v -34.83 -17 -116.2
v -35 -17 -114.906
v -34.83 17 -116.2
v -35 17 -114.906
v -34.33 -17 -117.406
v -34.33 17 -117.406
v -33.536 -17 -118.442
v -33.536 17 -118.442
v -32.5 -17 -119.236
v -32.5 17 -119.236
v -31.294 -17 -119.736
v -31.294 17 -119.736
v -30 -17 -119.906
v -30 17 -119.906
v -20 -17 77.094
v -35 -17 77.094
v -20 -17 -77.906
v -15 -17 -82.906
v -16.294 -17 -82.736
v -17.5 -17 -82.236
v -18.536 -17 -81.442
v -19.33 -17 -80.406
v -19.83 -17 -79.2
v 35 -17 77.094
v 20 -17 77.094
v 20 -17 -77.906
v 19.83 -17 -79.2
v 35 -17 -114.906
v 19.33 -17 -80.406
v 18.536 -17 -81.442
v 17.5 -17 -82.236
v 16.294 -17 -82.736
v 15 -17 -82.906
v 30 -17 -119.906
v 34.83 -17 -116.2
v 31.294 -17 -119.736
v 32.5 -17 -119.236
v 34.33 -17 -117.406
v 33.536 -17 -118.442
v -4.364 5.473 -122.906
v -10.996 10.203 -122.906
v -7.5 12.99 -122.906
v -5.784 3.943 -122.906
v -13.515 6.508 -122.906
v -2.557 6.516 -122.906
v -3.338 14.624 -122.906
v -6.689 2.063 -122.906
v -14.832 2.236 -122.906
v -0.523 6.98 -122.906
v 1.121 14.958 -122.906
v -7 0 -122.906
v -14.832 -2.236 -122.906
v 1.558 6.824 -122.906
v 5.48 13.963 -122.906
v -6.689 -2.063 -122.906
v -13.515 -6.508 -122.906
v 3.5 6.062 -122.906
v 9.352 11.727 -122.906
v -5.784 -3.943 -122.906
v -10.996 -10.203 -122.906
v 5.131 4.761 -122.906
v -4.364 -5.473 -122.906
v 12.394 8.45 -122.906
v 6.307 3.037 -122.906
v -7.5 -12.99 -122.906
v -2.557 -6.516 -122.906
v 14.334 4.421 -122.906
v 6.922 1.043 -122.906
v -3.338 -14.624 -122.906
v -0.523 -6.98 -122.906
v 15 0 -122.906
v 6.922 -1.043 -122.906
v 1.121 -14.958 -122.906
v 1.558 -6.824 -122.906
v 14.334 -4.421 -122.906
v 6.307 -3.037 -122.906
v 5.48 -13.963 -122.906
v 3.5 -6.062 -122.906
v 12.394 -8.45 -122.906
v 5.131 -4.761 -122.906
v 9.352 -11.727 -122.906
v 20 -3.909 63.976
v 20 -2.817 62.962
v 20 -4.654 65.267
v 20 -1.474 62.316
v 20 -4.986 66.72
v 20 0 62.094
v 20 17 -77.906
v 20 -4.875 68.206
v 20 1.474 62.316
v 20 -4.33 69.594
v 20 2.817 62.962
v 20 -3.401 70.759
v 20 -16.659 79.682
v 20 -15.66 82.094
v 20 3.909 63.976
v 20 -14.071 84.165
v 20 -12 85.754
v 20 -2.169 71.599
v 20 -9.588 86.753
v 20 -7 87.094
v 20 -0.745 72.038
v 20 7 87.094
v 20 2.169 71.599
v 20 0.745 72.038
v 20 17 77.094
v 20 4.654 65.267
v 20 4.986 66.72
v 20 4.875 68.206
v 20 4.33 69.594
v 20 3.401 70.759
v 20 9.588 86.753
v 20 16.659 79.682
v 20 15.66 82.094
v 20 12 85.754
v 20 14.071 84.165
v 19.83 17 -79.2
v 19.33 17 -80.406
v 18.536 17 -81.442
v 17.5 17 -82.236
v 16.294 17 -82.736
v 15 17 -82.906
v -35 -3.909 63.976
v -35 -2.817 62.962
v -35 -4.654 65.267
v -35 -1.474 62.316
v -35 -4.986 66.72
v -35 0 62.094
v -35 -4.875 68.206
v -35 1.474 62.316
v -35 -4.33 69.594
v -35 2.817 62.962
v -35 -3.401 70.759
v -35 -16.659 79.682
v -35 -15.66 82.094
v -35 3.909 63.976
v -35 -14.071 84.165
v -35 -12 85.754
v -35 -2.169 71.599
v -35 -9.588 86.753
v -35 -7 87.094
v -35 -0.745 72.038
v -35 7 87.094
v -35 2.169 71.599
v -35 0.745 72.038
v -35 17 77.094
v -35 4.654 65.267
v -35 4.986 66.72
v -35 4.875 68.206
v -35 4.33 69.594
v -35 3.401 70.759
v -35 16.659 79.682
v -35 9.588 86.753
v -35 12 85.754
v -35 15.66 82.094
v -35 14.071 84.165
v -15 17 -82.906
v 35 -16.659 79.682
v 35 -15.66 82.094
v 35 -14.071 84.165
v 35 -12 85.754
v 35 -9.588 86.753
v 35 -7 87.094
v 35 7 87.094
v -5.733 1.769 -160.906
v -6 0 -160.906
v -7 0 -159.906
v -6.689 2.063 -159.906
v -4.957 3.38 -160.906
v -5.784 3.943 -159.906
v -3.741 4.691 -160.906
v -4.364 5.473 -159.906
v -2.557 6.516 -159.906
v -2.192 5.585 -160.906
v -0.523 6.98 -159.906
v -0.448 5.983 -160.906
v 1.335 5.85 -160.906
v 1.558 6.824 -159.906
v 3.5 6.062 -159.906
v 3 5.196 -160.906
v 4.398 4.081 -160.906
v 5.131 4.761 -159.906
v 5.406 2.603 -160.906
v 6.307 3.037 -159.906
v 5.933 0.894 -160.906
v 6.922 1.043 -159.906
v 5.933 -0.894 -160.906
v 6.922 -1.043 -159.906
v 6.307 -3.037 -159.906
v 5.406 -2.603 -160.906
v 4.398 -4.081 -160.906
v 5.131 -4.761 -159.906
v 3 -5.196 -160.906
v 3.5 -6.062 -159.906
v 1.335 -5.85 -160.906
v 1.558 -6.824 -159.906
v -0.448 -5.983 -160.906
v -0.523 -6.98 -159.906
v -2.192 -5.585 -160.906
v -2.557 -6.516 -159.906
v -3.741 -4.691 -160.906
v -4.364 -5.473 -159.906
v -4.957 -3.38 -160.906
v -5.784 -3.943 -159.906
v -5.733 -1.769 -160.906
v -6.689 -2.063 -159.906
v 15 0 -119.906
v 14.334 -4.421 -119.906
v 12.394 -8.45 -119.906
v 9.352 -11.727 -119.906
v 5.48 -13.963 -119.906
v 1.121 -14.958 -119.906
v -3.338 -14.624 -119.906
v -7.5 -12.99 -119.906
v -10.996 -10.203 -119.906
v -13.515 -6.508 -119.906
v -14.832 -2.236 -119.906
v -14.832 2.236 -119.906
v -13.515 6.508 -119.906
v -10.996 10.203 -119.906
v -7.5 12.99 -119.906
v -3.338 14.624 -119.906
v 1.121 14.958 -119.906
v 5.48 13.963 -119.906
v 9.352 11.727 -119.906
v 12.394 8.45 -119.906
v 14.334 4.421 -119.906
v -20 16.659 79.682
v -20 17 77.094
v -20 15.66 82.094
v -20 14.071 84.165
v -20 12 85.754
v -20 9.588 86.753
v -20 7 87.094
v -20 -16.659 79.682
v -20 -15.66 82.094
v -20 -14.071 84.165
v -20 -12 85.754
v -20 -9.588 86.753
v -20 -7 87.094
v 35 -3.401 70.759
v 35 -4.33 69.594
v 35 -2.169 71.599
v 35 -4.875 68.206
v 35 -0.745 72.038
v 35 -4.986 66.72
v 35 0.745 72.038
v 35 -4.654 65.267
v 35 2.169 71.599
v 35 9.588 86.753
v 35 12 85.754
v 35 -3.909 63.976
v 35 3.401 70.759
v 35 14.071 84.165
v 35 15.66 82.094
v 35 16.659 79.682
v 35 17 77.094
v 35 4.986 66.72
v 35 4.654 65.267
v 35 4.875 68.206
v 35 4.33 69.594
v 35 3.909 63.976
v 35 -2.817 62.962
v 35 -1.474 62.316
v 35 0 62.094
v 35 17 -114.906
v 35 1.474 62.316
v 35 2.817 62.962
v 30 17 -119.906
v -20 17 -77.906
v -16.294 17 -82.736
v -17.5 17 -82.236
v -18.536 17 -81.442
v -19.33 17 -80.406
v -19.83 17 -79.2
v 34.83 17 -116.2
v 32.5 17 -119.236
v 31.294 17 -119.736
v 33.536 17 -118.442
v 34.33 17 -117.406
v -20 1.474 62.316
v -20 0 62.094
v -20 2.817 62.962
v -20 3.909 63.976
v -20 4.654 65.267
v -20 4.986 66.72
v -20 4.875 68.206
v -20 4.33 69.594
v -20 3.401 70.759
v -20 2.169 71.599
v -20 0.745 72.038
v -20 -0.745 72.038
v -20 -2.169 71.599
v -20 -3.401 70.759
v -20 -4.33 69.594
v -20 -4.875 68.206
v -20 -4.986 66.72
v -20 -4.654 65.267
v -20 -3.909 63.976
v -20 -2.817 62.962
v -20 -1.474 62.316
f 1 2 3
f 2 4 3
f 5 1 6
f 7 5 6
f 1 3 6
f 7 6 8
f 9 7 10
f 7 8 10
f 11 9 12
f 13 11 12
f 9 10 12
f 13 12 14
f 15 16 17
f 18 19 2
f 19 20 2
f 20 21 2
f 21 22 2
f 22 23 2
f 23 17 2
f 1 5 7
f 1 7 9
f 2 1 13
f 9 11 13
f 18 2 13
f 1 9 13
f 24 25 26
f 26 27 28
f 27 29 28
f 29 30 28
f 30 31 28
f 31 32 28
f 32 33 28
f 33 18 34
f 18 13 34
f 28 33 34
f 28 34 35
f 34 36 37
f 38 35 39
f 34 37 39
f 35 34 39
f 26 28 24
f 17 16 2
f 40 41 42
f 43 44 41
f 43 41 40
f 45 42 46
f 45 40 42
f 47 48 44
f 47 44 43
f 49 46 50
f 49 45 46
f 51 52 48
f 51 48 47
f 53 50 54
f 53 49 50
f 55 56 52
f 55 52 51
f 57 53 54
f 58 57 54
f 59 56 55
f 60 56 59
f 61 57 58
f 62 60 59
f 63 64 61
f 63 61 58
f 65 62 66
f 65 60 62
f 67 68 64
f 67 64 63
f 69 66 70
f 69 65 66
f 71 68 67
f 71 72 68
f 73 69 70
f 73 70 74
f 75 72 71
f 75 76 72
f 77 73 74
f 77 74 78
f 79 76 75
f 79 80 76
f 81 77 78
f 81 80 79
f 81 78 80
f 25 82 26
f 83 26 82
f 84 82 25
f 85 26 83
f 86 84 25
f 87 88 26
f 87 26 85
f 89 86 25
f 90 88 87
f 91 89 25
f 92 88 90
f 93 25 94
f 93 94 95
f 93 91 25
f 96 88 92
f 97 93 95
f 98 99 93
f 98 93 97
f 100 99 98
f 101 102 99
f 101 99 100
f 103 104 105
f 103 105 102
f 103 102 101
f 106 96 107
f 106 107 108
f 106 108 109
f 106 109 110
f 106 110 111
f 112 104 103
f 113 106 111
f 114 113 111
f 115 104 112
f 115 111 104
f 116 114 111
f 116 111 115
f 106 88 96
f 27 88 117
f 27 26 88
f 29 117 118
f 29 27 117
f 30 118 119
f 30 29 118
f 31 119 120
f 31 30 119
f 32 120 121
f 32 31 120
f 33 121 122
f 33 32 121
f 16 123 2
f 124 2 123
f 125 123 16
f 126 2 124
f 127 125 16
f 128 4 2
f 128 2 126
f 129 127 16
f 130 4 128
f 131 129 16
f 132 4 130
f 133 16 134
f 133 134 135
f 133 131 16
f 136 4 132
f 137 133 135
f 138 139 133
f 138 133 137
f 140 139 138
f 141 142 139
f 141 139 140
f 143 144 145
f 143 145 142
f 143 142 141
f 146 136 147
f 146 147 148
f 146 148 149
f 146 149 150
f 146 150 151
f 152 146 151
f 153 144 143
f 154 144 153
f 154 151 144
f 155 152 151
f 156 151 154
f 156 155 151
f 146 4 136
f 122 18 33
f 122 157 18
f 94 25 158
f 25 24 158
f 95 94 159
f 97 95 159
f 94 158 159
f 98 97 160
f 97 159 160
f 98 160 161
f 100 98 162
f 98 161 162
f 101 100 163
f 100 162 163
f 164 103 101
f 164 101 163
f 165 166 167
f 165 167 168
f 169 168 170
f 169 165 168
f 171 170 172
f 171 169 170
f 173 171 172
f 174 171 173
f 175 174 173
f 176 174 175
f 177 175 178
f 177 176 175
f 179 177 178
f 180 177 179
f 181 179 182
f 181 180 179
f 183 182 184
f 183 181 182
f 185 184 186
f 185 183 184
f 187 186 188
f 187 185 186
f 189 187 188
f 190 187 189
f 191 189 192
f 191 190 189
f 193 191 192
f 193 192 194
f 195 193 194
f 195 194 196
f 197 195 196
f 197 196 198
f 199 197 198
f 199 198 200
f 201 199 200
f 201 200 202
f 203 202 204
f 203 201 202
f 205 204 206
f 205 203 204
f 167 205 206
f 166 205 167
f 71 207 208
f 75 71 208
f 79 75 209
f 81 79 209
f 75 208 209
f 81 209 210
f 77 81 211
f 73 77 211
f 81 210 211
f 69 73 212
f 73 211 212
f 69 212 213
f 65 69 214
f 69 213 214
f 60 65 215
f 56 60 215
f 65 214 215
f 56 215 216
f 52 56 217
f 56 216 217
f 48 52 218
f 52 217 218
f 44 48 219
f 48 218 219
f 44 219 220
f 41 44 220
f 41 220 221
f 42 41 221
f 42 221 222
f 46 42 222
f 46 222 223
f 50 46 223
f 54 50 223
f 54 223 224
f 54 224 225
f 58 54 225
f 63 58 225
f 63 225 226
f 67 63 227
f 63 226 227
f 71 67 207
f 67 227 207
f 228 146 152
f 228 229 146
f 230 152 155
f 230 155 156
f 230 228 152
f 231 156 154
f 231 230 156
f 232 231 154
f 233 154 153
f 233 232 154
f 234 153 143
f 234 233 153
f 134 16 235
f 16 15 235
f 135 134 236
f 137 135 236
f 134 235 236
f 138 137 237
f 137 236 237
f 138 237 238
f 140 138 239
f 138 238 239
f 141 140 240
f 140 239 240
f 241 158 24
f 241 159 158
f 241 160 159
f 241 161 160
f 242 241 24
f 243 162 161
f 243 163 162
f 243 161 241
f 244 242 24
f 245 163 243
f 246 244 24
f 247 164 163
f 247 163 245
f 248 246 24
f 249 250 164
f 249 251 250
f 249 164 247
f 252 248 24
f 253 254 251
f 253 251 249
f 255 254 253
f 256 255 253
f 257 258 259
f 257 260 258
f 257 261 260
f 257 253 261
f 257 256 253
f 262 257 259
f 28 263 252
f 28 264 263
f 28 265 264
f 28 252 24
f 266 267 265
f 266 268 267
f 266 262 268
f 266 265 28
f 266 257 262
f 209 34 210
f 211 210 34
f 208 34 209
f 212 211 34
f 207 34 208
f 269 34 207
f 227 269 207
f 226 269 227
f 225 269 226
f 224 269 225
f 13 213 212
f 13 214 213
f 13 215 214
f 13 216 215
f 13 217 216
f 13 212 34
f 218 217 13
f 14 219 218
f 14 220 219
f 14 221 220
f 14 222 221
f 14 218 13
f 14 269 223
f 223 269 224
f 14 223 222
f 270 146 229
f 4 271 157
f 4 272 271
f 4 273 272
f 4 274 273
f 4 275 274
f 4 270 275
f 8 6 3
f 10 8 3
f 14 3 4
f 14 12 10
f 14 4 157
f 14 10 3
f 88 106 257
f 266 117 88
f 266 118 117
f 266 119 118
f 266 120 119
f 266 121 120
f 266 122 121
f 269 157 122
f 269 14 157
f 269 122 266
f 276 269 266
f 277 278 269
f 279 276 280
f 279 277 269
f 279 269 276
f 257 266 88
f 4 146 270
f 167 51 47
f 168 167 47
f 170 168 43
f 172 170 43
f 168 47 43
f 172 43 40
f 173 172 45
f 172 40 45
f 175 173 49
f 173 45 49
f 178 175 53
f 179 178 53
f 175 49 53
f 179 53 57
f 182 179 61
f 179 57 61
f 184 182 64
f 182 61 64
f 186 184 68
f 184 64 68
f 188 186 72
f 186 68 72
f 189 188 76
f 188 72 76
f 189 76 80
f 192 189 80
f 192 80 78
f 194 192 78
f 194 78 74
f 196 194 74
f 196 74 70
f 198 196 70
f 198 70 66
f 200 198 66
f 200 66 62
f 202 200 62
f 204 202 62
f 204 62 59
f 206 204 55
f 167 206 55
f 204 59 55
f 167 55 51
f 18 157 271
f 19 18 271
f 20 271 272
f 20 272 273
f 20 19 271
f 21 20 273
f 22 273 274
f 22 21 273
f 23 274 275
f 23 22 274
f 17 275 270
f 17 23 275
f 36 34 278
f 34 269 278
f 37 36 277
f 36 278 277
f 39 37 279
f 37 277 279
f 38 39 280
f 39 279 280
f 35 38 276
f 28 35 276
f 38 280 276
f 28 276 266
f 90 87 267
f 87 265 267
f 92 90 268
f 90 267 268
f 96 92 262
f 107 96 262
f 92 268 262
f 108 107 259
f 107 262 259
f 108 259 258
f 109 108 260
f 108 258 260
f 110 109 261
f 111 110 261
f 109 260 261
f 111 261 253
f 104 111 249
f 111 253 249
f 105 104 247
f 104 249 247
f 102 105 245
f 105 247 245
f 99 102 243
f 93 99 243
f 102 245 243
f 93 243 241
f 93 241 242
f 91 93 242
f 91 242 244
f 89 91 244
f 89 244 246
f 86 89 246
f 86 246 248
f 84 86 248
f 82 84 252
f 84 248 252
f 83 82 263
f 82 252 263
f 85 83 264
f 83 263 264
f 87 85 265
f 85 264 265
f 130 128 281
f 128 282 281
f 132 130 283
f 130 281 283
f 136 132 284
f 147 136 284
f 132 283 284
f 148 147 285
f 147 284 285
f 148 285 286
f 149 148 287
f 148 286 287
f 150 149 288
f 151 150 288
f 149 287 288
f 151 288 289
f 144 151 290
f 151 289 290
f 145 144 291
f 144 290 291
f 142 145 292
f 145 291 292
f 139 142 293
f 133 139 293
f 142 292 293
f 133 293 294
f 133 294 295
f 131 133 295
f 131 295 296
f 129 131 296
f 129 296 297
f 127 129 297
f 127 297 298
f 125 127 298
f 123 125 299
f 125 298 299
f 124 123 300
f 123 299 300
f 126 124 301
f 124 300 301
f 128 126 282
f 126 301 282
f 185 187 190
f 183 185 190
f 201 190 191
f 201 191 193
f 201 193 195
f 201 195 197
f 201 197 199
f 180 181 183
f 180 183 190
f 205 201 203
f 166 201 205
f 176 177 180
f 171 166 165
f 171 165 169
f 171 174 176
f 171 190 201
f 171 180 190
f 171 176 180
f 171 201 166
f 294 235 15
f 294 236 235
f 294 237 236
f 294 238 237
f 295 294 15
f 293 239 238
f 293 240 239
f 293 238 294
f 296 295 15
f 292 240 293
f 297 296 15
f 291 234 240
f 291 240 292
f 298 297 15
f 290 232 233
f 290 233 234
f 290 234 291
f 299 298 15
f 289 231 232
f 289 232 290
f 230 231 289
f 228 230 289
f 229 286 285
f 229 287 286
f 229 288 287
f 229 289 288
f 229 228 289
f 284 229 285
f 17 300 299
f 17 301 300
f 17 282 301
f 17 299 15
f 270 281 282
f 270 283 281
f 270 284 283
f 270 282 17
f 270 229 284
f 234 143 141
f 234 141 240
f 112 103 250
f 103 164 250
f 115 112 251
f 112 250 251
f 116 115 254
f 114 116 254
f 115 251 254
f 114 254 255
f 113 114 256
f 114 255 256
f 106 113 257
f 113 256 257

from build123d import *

# Parameters (mm, degrees)
EXTRUDE_1_DEPTH     = 17
FILLET_1_R          = 5
SKETCH_2_R          = 15
EXTRUDE_2_DEPTH     = 3
SKETCH_4_R          = 5
CUT_EXTRUDE_1_DEPTH = 56
SKETCH_3_R          = 7
EXTRUDE_3_DEPTH     = 38
FILLET_2_R          = 10
CHAMFER_1_SIZE      = 1


with BuildPart() as part:
    # 草图1 → 凸台-拉伸1 (new, symmetric)
    with BuildSketch(Plane(origin=(0, 0, 0), x_dir=(1, 0, 0), z_dir=(0, 1, 0))):
        Polygon((20, -87.093671679), (35, -87.093671679), (35, 119.906328321), (-35, 119.906328321), (-35, -87.093671679), (-20, -87.093671679), (-20, 82.906328321), (20, 82.906328321), align=None)
    extrude(amount=EXTRUDE_1_DEPTH, both=True)

    # 圆角1
    fillet_1_edges = [part.edges().sort_by_distance(p)[0] for p in [
        (-35, 0, -119.906328321),
        (35, 0, -119.906328321),
        (20, 0, -82.906328321),
        (-20, 0, -82.906328321),
    ]]
    fillet(fillet_1_edges, radius=FILLET_1_R)

    # 草图2 → 凸台-拉伸2 (add)
    with BuildSketch(Plane(origin=(0, 0, -119.906328321), x_dir=(-1, 0, 0), z_dir=(0, 0, -1))):
        with Locations(Location((0, 0, 0), (0, 0, 180))):
            Circle(SKETCH_2_R)
    extrude(amount=EXTRUDE_2_DEPTH)

    # 草图4 → 切除-拉伸1 (cut, symmetric)
    with BuildSketch(Plane(origin=(0, 0, 0), x_dir=(0, 0, -1), z_dir=(1, 0, 0))):
        with Locations((-67.093671679, 0)):
            Circle(SKETCH_4_R)
    extrude(amount=CUT_EXTRUDE_1_DEPTH, both=True, mode=Mode.SUBTRACT)

    # 草图3 → 凸台-拉伸3 (add)
    with BuildSketch(Plane(origin=(0, 0, -122.906328321), x_dir=(-1, 0, 0), z_dir=(0, 0, -1))):
        Circle(SKETCH_3_R)
    extrude(amount=EXTRUDE_3_DEPTH)

    # 圆角2
    fillet_2_edges = [part.edges().sort_by_distance(p)[0] for p in [
        (-27.5, -17, 87.093671679),
        (27.5, 17, 87.093671679),
        (-27.5, 17, 87.093671679),
        (27.5, -17, 87.093671679),
    ]]
    fillet(fillet_2_edges, radius=FILLET_2_R)

    # 倒角1
    chamfer_1_edges = [part.edges().sort_by_distance(p)[0] for p in [
        (7, 0, -160.906328321),
    ]]
    chamfer(chamfer_1_edges, length=CHAMFER_1_SIZE)


solid = part.part
